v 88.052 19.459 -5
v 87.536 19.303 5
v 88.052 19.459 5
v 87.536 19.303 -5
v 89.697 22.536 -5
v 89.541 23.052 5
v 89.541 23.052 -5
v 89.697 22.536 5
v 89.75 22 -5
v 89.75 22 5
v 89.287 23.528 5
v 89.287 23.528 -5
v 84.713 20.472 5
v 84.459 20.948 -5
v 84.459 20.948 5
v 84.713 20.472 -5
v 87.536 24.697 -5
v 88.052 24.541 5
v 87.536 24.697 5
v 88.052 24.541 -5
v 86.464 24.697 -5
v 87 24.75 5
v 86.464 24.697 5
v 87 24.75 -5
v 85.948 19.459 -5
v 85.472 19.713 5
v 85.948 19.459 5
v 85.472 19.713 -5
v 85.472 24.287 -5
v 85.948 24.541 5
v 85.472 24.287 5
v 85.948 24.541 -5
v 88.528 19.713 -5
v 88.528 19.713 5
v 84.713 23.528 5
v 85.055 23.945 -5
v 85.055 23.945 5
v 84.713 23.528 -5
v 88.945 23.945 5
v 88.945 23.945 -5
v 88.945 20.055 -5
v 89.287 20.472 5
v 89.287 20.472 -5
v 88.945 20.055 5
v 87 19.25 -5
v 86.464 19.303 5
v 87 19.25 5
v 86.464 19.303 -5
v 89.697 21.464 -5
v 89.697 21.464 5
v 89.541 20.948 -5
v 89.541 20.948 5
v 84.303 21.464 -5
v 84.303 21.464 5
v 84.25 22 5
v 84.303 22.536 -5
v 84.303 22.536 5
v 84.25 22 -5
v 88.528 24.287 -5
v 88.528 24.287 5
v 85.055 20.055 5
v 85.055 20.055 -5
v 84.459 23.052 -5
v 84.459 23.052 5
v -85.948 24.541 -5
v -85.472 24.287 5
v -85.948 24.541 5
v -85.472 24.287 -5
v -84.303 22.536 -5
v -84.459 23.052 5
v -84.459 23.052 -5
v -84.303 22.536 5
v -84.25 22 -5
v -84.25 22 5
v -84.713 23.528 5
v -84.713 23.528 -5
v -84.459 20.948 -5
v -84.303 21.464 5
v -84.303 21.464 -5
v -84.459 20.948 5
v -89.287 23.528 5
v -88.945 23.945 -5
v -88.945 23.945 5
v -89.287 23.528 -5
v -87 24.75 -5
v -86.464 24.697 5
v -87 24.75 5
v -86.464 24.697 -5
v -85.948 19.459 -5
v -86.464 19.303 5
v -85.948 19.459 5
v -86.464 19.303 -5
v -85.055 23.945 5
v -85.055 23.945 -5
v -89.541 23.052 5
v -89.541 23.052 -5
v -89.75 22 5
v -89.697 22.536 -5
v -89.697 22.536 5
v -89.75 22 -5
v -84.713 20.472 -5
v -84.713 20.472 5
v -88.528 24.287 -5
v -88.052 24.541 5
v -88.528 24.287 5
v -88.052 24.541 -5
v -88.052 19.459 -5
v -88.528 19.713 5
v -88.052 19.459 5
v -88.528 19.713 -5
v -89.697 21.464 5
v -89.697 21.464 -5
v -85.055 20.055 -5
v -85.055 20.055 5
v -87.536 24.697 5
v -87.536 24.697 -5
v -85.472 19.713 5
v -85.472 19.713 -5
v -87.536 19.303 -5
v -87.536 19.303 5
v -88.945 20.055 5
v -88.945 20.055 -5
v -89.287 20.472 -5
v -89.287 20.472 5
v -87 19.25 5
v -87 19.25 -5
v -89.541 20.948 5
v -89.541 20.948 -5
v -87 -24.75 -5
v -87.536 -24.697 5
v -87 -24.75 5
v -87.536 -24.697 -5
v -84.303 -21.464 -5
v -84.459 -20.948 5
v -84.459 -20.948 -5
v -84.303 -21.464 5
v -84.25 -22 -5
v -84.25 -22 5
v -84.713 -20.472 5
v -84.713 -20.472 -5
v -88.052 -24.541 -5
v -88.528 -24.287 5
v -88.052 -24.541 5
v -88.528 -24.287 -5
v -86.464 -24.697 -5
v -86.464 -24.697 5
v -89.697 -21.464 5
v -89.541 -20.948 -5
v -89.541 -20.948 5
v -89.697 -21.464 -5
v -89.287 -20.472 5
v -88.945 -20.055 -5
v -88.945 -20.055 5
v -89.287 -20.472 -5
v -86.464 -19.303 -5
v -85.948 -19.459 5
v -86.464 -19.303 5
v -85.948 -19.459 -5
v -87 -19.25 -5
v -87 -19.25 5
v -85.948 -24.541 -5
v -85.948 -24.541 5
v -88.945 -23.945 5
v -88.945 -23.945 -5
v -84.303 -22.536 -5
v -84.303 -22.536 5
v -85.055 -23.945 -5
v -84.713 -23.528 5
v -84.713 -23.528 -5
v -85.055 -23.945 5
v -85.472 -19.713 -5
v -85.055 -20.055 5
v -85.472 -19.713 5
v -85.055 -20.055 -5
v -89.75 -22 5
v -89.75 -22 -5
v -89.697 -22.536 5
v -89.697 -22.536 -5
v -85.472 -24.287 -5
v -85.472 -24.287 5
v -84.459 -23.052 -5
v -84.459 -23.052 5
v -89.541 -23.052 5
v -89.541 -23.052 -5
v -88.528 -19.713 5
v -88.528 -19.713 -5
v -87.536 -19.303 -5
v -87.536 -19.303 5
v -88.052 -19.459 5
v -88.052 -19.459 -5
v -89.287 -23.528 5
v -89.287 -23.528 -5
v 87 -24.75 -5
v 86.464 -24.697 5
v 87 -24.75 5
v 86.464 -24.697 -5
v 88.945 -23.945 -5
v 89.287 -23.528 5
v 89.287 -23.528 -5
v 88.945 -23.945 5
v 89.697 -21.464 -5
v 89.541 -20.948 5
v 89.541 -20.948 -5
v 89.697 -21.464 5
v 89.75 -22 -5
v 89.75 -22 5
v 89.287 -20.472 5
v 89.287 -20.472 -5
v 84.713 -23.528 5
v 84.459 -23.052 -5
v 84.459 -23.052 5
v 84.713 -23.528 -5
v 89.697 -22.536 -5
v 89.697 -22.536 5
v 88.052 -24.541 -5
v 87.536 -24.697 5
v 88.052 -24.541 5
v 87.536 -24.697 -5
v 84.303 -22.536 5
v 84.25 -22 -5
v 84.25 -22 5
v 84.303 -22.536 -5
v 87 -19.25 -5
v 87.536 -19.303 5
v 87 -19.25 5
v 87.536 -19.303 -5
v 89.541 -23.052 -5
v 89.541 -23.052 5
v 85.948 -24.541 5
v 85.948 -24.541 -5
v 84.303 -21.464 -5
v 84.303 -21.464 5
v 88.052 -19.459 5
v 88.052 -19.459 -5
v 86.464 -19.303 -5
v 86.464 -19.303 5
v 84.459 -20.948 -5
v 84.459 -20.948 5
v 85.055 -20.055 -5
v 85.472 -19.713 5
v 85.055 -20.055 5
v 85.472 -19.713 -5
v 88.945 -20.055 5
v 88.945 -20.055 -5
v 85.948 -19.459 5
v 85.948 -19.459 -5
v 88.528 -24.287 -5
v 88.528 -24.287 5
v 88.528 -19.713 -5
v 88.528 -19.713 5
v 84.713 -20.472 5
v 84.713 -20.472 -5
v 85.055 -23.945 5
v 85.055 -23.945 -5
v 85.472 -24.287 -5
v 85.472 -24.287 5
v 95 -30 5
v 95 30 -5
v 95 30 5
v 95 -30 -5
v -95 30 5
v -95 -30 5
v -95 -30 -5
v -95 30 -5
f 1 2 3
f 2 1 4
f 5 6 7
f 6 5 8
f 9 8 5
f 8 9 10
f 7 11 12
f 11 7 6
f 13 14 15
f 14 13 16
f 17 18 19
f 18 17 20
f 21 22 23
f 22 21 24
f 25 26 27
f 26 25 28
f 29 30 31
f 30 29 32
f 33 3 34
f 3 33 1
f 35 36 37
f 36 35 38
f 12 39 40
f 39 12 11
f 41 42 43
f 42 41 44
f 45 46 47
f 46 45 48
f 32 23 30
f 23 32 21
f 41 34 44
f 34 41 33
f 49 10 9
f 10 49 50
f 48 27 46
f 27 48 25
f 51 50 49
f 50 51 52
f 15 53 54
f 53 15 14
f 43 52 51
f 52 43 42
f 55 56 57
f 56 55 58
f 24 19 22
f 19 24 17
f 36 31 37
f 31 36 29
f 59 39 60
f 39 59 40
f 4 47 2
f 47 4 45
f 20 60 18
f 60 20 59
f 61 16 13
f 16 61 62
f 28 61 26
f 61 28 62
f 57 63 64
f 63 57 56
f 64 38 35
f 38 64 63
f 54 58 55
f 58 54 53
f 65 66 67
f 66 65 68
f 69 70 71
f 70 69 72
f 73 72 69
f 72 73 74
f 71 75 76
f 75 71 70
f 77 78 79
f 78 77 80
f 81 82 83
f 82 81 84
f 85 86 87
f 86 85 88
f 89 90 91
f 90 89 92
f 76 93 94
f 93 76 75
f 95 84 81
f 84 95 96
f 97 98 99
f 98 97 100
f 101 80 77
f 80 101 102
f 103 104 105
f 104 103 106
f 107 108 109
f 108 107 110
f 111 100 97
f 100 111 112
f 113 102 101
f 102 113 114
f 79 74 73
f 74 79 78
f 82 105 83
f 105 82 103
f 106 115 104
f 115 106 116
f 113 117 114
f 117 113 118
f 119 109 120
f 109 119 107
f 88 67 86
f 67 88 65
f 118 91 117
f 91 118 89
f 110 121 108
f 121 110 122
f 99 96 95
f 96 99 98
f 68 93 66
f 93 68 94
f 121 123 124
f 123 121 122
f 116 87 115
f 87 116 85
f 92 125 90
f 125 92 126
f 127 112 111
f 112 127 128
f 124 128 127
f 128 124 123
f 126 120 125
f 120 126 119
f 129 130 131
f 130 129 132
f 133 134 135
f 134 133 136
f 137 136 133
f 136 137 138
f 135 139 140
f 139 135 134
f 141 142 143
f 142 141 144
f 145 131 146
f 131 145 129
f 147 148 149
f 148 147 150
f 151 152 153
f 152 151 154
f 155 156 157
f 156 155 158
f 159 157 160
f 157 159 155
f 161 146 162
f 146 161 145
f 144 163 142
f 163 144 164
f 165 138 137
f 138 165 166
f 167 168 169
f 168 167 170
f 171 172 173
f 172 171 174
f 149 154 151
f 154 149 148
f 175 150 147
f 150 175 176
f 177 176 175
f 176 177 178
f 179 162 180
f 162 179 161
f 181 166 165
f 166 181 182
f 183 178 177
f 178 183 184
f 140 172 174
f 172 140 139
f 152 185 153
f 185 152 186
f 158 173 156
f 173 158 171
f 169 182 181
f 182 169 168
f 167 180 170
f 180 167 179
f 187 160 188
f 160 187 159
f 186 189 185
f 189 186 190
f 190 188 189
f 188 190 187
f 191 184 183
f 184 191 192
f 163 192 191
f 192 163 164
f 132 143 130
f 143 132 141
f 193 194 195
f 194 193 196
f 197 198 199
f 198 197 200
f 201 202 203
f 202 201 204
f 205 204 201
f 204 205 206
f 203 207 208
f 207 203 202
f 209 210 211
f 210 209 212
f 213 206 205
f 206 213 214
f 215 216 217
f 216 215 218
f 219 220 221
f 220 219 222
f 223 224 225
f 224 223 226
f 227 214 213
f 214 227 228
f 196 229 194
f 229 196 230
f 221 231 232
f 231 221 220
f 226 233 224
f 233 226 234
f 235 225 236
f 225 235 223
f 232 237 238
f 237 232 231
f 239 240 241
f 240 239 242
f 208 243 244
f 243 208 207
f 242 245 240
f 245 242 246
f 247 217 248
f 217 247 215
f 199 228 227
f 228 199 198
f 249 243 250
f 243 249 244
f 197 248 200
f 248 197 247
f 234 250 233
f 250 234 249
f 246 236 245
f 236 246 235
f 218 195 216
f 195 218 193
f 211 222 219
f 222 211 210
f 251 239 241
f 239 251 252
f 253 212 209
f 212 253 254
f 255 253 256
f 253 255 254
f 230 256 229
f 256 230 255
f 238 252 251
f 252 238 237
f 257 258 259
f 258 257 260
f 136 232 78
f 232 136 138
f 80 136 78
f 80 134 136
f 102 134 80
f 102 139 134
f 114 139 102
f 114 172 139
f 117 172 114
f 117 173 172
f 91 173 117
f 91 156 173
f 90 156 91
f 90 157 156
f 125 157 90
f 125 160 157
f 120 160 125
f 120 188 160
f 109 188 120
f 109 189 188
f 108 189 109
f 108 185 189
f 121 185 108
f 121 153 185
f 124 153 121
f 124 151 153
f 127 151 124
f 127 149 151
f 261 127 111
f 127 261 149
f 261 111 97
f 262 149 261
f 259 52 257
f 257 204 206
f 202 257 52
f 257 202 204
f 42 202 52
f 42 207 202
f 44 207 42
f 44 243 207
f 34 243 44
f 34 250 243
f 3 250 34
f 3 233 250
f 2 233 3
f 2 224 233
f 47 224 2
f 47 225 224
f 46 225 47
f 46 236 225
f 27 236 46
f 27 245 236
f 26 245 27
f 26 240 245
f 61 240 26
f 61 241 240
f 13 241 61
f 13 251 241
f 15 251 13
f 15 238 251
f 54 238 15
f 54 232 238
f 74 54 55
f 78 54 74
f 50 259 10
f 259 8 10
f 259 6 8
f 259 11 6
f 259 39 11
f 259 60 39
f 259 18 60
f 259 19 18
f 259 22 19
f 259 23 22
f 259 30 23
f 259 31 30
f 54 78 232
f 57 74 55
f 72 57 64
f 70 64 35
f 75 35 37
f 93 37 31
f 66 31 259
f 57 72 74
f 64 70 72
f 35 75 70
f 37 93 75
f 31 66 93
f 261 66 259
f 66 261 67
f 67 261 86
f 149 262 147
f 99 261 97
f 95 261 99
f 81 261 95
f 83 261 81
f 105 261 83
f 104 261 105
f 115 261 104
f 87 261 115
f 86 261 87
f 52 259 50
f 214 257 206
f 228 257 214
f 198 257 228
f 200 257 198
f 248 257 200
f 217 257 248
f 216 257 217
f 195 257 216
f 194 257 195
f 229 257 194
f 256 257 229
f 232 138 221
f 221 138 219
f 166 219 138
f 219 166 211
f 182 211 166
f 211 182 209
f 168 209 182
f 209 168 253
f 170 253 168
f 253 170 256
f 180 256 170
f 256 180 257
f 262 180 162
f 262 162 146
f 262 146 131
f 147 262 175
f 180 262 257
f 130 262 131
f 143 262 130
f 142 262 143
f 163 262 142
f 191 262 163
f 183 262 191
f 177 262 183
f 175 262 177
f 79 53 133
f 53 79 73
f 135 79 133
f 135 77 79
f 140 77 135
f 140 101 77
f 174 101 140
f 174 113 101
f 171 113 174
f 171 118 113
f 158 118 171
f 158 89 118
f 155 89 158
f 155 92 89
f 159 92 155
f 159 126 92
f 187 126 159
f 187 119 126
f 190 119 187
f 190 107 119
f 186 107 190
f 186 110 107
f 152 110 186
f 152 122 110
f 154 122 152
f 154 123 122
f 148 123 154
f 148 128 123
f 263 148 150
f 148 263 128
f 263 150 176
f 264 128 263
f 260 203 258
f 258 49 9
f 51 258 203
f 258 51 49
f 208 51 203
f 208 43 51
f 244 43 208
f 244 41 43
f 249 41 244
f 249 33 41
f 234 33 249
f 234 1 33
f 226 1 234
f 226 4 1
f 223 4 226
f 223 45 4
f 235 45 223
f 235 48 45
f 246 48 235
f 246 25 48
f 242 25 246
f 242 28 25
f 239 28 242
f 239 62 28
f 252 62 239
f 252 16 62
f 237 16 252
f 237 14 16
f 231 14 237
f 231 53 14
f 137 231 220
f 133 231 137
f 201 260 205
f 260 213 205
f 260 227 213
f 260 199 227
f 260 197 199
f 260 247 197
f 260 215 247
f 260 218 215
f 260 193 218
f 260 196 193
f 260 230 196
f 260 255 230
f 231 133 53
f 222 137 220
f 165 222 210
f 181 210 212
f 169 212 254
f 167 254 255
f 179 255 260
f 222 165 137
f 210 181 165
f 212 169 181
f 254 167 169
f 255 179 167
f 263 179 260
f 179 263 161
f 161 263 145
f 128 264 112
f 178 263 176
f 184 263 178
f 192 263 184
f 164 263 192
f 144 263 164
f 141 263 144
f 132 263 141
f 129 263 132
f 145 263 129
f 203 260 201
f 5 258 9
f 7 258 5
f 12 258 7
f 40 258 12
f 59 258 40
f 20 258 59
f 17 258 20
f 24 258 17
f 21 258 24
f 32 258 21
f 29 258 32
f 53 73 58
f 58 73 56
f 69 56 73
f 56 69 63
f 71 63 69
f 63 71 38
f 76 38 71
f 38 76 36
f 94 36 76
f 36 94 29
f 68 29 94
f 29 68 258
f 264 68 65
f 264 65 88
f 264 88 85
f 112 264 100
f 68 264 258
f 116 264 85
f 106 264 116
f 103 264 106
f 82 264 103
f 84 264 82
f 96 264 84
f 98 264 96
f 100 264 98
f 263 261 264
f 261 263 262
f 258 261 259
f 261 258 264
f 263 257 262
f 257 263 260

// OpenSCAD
$fn = 32;

// ----------------------------------------------------------------------
// Corner plate 190 x 60 x 10
// 4 holes, centres taken from the edge offset
// ----------------------------------------------------------------------

// --- parameters (mm) ---
plate = [190, 60, 10];  // overall size (x, y, z)
holes = 4;              // number of holes the drawing asks for
hole_d = 5.5;           // hole diameter
edge = 8;               // hole centre offset from the plate edge

// --- derived feature positions (mm) ---
corner_x = plate[0] / 2 - edge;  // = 87   corner hole X
corner_y = plate[1] / 2 - edge;  // = 22   corner hole Y
feature_centers = [
  [corner_x, corner_y],
  [-corner_x, corner_y],
  [-corner_x, -corner_y],
  [corner_x, -corner_y]
];   // hole centres the loop below drills

// plate outline, every hole drilled through with the same cutters
difference() {
  cube(plate, center = true);
  for (centre = feature_centers)
    translate([centre[0], centre[1], 0])
      cylinder(d = hole_d, h = plate[2] + 2, center = true);
}
